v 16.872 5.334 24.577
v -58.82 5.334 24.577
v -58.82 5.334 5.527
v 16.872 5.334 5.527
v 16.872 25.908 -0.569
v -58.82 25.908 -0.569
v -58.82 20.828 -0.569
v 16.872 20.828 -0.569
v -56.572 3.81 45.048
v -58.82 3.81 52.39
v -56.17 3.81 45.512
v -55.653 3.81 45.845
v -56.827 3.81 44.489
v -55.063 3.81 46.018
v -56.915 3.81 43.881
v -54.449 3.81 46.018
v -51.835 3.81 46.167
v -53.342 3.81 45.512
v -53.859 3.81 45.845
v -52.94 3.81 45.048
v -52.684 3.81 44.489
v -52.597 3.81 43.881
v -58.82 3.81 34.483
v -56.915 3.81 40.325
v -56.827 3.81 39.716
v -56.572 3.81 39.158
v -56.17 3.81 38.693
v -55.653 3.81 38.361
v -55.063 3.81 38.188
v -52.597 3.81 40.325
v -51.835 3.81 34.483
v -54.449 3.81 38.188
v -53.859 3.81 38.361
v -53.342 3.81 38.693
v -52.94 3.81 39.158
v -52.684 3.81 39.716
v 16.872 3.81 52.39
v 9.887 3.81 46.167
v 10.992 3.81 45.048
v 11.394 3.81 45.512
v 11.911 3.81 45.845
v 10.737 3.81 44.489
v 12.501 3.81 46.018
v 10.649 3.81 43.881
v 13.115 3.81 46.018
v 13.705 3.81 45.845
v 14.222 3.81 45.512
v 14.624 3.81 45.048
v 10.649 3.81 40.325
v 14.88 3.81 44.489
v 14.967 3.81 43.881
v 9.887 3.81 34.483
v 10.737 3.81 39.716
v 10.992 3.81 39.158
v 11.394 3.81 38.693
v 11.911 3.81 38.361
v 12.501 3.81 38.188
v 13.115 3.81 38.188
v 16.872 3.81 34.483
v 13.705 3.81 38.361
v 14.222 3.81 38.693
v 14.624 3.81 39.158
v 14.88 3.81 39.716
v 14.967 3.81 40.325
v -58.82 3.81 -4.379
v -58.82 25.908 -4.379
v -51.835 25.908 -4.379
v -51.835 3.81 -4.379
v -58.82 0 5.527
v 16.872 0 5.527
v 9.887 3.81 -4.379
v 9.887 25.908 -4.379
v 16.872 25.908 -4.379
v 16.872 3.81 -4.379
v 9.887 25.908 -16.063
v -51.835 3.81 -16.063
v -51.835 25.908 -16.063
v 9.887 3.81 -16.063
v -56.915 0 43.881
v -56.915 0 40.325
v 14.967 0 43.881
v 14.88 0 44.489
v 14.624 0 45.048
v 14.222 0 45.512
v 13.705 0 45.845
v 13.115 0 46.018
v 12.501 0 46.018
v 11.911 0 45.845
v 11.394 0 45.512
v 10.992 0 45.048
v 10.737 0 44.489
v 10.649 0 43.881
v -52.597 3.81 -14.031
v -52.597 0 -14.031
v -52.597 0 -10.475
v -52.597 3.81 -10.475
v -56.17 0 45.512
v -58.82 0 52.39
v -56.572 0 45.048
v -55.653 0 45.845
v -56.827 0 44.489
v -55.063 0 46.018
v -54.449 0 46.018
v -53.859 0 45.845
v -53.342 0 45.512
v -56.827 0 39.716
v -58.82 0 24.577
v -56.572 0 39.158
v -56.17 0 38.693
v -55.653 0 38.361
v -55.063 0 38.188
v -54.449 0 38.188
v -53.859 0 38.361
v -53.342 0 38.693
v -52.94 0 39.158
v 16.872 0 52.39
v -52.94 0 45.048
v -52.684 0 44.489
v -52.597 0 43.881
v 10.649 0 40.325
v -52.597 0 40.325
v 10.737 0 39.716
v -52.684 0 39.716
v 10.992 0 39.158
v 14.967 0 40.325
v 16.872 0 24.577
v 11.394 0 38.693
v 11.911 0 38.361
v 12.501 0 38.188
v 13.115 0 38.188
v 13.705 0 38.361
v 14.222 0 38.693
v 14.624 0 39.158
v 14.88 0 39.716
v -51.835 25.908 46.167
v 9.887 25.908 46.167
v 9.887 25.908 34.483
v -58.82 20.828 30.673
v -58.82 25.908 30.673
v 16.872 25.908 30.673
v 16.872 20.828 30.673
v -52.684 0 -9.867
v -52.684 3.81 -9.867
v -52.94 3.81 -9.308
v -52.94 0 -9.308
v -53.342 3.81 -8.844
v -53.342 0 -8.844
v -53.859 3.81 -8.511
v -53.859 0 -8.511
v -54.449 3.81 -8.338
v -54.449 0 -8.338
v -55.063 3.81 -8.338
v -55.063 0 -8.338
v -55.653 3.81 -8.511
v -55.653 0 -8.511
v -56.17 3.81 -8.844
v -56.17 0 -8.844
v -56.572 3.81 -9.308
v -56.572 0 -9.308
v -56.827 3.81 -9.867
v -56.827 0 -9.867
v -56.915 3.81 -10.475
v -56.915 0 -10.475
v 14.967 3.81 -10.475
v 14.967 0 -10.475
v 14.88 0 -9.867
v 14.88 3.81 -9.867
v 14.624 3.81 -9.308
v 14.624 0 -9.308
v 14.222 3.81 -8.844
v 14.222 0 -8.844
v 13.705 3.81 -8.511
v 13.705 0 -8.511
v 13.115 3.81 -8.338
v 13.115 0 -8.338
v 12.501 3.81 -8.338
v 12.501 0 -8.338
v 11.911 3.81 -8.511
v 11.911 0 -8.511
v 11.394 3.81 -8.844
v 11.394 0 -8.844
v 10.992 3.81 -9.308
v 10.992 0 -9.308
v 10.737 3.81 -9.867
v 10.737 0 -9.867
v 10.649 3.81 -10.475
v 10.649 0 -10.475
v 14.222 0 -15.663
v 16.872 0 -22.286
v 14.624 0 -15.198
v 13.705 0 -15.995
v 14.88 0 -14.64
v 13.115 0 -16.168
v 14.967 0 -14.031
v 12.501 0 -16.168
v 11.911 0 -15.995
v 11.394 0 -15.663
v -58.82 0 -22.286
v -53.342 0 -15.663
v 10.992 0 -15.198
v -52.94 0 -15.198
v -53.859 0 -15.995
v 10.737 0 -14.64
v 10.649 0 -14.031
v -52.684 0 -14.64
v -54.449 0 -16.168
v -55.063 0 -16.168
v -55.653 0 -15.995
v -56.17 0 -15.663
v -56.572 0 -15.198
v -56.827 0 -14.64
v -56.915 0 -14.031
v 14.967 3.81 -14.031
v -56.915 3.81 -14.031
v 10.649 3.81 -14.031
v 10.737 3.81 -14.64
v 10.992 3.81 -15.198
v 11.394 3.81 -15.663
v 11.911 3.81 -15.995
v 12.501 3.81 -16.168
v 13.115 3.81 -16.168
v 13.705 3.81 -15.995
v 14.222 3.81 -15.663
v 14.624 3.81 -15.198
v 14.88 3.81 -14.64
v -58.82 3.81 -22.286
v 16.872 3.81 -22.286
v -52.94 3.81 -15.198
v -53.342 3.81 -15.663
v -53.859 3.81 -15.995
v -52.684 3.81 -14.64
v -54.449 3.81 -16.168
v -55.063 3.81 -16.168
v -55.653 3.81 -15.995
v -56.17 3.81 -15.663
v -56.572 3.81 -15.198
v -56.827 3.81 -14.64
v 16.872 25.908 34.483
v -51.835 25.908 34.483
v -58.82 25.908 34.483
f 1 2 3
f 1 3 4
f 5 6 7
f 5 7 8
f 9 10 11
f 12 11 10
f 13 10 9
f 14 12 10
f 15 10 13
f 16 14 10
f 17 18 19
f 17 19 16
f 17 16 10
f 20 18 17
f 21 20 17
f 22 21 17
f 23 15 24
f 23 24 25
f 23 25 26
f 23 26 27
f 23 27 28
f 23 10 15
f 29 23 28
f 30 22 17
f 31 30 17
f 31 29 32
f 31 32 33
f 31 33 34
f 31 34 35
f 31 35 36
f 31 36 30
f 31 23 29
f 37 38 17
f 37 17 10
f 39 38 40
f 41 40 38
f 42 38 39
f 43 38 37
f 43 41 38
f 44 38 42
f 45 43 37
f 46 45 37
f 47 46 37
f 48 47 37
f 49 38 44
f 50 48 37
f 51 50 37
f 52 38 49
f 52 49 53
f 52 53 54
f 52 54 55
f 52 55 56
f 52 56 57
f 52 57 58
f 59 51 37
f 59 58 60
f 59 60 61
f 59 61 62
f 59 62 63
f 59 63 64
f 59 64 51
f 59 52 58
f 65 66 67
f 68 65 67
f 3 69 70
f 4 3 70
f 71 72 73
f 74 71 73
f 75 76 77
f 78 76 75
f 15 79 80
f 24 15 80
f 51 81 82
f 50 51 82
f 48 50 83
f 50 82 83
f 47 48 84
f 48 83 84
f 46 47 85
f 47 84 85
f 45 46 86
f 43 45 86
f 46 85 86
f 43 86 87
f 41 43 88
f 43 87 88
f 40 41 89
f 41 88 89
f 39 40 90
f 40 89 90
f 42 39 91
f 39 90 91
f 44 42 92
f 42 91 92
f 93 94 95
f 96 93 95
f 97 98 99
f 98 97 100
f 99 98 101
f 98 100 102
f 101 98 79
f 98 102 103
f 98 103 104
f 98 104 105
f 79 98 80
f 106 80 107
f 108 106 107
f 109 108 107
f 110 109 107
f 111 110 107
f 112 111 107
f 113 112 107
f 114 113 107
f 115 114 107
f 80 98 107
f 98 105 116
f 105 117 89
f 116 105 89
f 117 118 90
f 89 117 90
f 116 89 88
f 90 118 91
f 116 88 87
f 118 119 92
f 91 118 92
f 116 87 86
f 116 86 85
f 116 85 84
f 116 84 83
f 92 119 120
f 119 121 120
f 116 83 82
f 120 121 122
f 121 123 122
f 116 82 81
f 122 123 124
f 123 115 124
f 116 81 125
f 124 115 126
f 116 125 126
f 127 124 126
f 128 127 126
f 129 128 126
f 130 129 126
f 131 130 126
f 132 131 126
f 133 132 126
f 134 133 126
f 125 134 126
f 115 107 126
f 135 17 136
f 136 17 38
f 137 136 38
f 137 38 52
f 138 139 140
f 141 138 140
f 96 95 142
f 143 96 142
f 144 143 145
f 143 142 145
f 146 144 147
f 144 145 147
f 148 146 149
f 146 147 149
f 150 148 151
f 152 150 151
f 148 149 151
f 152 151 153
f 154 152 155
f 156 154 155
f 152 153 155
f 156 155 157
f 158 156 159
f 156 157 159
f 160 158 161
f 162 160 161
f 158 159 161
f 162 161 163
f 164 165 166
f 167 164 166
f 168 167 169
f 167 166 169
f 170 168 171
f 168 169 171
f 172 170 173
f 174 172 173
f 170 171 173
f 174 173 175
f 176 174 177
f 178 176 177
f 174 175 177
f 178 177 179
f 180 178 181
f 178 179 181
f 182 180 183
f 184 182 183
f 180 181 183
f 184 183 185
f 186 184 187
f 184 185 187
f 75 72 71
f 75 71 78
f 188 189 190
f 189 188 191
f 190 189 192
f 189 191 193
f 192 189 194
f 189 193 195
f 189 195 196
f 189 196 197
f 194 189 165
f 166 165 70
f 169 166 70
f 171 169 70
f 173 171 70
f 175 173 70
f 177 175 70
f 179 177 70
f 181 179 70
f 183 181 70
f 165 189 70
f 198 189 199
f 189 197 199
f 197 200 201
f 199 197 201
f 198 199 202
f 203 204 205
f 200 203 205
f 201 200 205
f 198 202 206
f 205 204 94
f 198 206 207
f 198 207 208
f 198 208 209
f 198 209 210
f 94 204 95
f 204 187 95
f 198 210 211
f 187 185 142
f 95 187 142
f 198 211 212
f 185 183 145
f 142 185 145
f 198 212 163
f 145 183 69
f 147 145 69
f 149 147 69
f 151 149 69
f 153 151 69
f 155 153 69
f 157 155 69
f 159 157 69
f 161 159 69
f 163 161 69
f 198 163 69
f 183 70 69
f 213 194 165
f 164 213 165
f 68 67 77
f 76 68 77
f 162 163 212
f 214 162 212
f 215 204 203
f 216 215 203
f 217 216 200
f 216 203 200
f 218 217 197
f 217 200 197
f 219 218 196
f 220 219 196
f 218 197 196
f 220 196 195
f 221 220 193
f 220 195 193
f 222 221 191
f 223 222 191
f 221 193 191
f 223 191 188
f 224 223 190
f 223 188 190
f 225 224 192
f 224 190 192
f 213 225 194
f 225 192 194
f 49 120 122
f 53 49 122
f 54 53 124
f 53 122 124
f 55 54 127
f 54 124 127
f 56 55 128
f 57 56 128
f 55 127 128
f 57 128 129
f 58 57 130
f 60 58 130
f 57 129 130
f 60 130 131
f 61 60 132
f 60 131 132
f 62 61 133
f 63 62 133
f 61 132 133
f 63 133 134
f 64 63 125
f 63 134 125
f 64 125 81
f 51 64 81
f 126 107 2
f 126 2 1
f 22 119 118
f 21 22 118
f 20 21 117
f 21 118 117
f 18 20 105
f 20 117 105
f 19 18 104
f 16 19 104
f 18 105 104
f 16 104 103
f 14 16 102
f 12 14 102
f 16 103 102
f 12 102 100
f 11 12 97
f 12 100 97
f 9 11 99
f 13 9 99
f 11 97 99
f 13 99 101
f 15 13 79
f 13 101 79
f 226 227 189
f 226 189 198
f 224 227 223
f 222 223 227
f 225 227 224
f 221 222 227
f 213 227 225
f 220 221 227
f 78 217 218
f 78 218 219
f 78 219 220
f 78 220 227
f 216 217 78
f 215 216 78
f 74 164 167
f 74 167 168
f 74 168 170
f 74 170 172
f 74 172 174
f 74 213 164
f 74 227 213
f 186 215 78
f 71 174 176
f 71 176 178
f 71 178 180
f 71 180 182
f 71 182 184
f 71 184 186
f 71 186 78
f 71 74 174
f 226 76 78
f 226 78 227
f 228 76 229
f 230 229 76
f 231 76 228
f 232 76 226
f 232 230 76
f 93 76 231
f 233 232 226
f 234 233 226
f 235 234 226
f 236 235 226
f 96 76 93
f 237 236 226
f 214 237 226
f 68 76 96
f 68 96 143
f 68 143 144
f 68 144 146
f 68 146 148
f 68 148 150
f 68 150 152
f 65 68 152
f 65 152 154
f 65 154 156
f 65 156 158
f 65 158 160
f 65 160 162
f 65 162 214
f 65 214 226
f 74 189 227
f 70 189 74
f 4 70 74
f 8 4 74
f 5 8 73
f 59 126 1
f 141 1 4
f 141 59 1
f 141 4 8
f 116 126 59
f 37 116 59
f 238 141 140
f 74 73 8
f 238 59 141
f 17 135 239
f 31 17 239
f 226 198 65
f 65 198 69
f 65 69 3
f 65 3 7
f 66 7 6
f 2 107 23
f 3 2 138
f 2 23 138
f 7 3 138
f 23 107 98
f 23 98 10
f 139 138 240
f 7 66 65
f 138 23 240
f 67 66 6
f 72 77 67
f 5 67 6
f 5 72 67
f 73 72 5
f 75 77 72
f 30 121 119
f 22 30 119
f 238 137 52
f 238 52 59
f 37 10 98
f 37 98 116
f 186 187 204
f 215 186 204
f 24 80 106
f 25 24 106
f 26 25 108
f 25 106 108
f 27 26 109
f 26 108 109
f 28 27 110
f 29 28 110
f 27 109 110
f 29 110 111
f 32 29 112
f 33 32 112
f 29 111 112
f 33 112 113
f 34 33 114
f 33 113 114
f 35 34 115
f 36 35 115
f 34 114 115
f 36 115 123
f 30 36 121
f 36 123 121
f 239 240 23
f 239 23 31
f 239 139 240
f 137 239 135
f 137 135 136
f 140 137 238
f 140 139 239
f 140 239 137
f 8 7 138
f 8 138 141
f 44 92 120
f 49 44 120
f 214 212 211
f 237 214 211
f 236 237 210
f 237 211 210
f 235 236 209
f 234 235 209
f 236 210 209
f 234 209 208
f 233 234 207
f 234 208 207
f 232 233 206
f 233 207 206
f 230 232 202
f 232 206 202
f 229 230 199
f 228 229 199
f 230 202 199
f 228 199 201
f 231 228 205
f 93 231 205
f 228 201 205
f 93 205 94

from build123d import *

# Parameters (mm, degrees)
SKETCH1_W           = 75.692
SKETCH1_H           = 62.23
BOSS_EXTRUDE1_DEPTH = 25.908
SKETCH2_W           = 75.692
SKETCH2_H           = 31.242
CUT_EXTRUDE1_DEPTH  = 5.08
SKETCH4_W           = 6.985
SKETCH4_H           = 11.684
CUT_EXTRUDE4_DEPTH  = 22.098
SKETCH3_W           = 75.692
SKETCH3_H           = 19.05
CUT_EXTRUDE5_DEPTH  = 5.334
SKETCH8_W           = 75.692
SKETCH8_H           = 3.81
BOSS_EXTRUDE2_DEPTH = 6.223
SKETCH9_W           = 75.692
SKETCH9_H           = 3.81
BOSS_EXTRUDE3_DEPTH = 6.223
CUT_EXTRUDE6_REACH  = 84.92


with BuildPart() as part:
    # Sketch1 → Boss-Extrude1 (new body)
    with BuildSketch(Plane(origin=(0, 0, 0), x_dir=(1, 0, 0), z_dir=(0, 1, 0))):
        with Locations((-20.973907218, -15.051745981)):
            Rectangle(SKETCH1_W, SKETCH1_H)
    extrude(amount=BOSS_EXTRUDE1_DEPTH)

    # Sketch2 → Cut-Extrude1 (cut)
    with BuildSketch(Plane(origin=(0, 25.908, 0), x_dir=(1, 0, 0), z_dir=(0, 1, 0))):
        with Locations((-20.973907218, -15.051745981)):
            Rectangle(SKETCH2_W, SKETCH2_H)
    extrude(amount=-CUT_EXTRUDE1_DEPTH, mode=Mode.SUBTRACT)

    # Sketch4 → Cut-Extrude4 (cut)
    with BuildSketch(Plane(origin=(0, 25.908, 0), x_dir=(1, 0, 0), z_dir=(0, 1, 0))):
        with Locations((13.379592782, -40.324745981)):
            Rectangle(SKETCH4_W, SKETCH4_H)
        with Locations((-55.327407218, -40.324745981)):
            Rectangle(SKETCH4_W, SKETCH4_H)
        with Locations((-55.327407218, 10.221254019)):
            Rectangle(SKETCH4_W, SKETCH4_H)
        with Locations((13.379592782, 10.221254019)):
            Rectangle(SKETCH4_W, SKETCH4_H)
    extrude(amount=-CUT_EXTRUDE4_DEPTH, mode=Mode.SUBTRACT)

    # Sketch3 → Cut-Extrude5 (cut)
    with BuildSketch(Plane.XZ):
        with Locations((-20.973907218, 15.051745981)):
            Rectangle(SKETCH3_W, SKETCH3_H)
    extrude(amount=-CUT_EXTRUDE5_DEPTH, mode=Mode.SUBTRACT)

    # Sketch8 → Boss-Extrude2 (add)
    with BuildSketch(Plane.XY.offset(46.166745981)):
        with Locations((-20.973907218, 1.905)):
            Rectangle(SKETCH8_W, SKETCH8_H)
    extrude(amount=BOSS_EXTRUDE2_DEPTH)

    # Sketch9 → Boss-Extrude3 (add)
    with BuildSketch(Plane(origin=(0, 0, -16.063254019), x_dir=(-1, 0, 0), z_dir=(0, 0, -1))):
        with Locations((20.973907218, 1.905)):
            Rectangle(SKETCH9_W, SKETCH9_H)
    extrude(amount=BOSS_EXTRUDE3_DEPTH)

    # Sketch7 → Cut-Extrude6 (cut, up to next)
    with BuildSketch(Plane.XZ, mode=Mode.PRIVATE) as cut_extrude6_sk1:
        with BuildLine():
            Line((-56.914907218, 43.880745981), (-56.914907218, 40.324745981))
            ThreePointArc((-56.914907218, 40.324745981), (-54.755907218, 38.165745981), (-52.596907218, 40.324745981))
            Line((-52.596907218, 40.324745981), (-52.596907218, 43.880745981))
            ThreePointArc((-52.596907218, 43.880745981), (-54.755907218, 46.039745981), (-56.914907218, 43.880745981))
        make_face()
    cut_extrude6_tool1 = extrude(cut_extrude6_sk1.sketch, amount=-CUT_EXTRUDE6_REACH, mode=Mode.PRIVATE) & part.part
    # Sketch7 → Cut-Extrude6 (cut, up to next)
    with BuildSketch(Plane.XZ, mode=Mode.PRIVATE) as cut_extrude6_sk2:
        with BuildLine():
            Line((10.649092782, 43.880745981), (10.649092782, 40.324745981))
            ThreePointArc((10.649092782, 40.324745981), (12.808092782, 38.165745981), (14.967092782, 40.324745981))
            Line((14.967092782, 40.324745981), (14.967092782, 43.880745981))
            ThreePointArc((14.967092782, 43.880745981), (12.808092782, 46.039745981), (10.649092782, 43.880745981))
        make_face()
    cut_extrude6_tool2 = extrude(cut_extrude6_sk2.sketch, amount=-CUT_EXTRUDE6_REACH, mode=Mode.PRIVATE) & part.part
    # Sketch7 → Cut-Extrude6 (cut, up to next)
    with BuildSketch(Plane.XZ, mode=Mode.PRIVATE) as cut_extrude6_sk3:
        with BuildLine():
            Line((10.649092782, -10.475254019), (10.649092782, -14.031254019))
            ThreePointArc((10.649092782, -14.031254019), (12.808092782, -16.190254019), (14.967092782, -14.031254019))
            Line((14.967092782, -14.031254019), (14.967092782, -10.475254019))
            ThreePointArc((14.967092782, -10.475254019), (12.808092782, -8.316254019), (10.649092782, -10.475254019))
        make_face()
    cut_extrude6_tool3 = extrude(cut_extrude6_sk3.sketch, amount=-CUT_EXTRUDE6_REACH, mode=Mode.PRIVATE) & part.part
    # Sketch7 → Cut-Extrude6 (cut, up to next)
    with BuildSketch(Plane.XZ, mode=Mode.PRIVATE) as cut_extrude6_sk4:
        with BuildLine():
            Line((-56.914907218, -10.475254019), (-56.914907218, -14.031254019))
            ThreePointArc((-56.914907218, -14.031254019), (-54.755907218, -16.190254019), (-52.596907218, -14.031254019))
            Line((-52.596907218, -14.031254019), (-52.596907218, -10.475254019))
            ThreePointArc((-52.596907218, -10.475254019), (-54.755907218, -8.316254019), (-56.914907218, -10.475254019))
        make_face()
    cut_extrude6_tool4 = extrude(cut_extrude6_sk4.sketch, amount=-CUT_EXTRUDE6_REACH, mode=Mode.PRIVATE) & part.part
    add(cut_extrude6_tool1.solids().sort_by_distance((-54.755907, 0, 42.102746))[0], mode=Mode.SUBTRACT)
    add(cut_extrude6_tool2.solids().sort_by_distance((12.808093, 0, 42.102746))[0], mode=Mode.SUBTRACT)
    add(cut_extrude6_tool3.solids().sort_by_distance((12.808093, 0, -12.253254))[0], mode=Mode.SUBTRACT)
    add(cut_extrude6_tool4.solids().sort_by_distance((-54.755907, 0, -12.253254))[0], mode=Mode.SUBTRACT)


solid = part.part
